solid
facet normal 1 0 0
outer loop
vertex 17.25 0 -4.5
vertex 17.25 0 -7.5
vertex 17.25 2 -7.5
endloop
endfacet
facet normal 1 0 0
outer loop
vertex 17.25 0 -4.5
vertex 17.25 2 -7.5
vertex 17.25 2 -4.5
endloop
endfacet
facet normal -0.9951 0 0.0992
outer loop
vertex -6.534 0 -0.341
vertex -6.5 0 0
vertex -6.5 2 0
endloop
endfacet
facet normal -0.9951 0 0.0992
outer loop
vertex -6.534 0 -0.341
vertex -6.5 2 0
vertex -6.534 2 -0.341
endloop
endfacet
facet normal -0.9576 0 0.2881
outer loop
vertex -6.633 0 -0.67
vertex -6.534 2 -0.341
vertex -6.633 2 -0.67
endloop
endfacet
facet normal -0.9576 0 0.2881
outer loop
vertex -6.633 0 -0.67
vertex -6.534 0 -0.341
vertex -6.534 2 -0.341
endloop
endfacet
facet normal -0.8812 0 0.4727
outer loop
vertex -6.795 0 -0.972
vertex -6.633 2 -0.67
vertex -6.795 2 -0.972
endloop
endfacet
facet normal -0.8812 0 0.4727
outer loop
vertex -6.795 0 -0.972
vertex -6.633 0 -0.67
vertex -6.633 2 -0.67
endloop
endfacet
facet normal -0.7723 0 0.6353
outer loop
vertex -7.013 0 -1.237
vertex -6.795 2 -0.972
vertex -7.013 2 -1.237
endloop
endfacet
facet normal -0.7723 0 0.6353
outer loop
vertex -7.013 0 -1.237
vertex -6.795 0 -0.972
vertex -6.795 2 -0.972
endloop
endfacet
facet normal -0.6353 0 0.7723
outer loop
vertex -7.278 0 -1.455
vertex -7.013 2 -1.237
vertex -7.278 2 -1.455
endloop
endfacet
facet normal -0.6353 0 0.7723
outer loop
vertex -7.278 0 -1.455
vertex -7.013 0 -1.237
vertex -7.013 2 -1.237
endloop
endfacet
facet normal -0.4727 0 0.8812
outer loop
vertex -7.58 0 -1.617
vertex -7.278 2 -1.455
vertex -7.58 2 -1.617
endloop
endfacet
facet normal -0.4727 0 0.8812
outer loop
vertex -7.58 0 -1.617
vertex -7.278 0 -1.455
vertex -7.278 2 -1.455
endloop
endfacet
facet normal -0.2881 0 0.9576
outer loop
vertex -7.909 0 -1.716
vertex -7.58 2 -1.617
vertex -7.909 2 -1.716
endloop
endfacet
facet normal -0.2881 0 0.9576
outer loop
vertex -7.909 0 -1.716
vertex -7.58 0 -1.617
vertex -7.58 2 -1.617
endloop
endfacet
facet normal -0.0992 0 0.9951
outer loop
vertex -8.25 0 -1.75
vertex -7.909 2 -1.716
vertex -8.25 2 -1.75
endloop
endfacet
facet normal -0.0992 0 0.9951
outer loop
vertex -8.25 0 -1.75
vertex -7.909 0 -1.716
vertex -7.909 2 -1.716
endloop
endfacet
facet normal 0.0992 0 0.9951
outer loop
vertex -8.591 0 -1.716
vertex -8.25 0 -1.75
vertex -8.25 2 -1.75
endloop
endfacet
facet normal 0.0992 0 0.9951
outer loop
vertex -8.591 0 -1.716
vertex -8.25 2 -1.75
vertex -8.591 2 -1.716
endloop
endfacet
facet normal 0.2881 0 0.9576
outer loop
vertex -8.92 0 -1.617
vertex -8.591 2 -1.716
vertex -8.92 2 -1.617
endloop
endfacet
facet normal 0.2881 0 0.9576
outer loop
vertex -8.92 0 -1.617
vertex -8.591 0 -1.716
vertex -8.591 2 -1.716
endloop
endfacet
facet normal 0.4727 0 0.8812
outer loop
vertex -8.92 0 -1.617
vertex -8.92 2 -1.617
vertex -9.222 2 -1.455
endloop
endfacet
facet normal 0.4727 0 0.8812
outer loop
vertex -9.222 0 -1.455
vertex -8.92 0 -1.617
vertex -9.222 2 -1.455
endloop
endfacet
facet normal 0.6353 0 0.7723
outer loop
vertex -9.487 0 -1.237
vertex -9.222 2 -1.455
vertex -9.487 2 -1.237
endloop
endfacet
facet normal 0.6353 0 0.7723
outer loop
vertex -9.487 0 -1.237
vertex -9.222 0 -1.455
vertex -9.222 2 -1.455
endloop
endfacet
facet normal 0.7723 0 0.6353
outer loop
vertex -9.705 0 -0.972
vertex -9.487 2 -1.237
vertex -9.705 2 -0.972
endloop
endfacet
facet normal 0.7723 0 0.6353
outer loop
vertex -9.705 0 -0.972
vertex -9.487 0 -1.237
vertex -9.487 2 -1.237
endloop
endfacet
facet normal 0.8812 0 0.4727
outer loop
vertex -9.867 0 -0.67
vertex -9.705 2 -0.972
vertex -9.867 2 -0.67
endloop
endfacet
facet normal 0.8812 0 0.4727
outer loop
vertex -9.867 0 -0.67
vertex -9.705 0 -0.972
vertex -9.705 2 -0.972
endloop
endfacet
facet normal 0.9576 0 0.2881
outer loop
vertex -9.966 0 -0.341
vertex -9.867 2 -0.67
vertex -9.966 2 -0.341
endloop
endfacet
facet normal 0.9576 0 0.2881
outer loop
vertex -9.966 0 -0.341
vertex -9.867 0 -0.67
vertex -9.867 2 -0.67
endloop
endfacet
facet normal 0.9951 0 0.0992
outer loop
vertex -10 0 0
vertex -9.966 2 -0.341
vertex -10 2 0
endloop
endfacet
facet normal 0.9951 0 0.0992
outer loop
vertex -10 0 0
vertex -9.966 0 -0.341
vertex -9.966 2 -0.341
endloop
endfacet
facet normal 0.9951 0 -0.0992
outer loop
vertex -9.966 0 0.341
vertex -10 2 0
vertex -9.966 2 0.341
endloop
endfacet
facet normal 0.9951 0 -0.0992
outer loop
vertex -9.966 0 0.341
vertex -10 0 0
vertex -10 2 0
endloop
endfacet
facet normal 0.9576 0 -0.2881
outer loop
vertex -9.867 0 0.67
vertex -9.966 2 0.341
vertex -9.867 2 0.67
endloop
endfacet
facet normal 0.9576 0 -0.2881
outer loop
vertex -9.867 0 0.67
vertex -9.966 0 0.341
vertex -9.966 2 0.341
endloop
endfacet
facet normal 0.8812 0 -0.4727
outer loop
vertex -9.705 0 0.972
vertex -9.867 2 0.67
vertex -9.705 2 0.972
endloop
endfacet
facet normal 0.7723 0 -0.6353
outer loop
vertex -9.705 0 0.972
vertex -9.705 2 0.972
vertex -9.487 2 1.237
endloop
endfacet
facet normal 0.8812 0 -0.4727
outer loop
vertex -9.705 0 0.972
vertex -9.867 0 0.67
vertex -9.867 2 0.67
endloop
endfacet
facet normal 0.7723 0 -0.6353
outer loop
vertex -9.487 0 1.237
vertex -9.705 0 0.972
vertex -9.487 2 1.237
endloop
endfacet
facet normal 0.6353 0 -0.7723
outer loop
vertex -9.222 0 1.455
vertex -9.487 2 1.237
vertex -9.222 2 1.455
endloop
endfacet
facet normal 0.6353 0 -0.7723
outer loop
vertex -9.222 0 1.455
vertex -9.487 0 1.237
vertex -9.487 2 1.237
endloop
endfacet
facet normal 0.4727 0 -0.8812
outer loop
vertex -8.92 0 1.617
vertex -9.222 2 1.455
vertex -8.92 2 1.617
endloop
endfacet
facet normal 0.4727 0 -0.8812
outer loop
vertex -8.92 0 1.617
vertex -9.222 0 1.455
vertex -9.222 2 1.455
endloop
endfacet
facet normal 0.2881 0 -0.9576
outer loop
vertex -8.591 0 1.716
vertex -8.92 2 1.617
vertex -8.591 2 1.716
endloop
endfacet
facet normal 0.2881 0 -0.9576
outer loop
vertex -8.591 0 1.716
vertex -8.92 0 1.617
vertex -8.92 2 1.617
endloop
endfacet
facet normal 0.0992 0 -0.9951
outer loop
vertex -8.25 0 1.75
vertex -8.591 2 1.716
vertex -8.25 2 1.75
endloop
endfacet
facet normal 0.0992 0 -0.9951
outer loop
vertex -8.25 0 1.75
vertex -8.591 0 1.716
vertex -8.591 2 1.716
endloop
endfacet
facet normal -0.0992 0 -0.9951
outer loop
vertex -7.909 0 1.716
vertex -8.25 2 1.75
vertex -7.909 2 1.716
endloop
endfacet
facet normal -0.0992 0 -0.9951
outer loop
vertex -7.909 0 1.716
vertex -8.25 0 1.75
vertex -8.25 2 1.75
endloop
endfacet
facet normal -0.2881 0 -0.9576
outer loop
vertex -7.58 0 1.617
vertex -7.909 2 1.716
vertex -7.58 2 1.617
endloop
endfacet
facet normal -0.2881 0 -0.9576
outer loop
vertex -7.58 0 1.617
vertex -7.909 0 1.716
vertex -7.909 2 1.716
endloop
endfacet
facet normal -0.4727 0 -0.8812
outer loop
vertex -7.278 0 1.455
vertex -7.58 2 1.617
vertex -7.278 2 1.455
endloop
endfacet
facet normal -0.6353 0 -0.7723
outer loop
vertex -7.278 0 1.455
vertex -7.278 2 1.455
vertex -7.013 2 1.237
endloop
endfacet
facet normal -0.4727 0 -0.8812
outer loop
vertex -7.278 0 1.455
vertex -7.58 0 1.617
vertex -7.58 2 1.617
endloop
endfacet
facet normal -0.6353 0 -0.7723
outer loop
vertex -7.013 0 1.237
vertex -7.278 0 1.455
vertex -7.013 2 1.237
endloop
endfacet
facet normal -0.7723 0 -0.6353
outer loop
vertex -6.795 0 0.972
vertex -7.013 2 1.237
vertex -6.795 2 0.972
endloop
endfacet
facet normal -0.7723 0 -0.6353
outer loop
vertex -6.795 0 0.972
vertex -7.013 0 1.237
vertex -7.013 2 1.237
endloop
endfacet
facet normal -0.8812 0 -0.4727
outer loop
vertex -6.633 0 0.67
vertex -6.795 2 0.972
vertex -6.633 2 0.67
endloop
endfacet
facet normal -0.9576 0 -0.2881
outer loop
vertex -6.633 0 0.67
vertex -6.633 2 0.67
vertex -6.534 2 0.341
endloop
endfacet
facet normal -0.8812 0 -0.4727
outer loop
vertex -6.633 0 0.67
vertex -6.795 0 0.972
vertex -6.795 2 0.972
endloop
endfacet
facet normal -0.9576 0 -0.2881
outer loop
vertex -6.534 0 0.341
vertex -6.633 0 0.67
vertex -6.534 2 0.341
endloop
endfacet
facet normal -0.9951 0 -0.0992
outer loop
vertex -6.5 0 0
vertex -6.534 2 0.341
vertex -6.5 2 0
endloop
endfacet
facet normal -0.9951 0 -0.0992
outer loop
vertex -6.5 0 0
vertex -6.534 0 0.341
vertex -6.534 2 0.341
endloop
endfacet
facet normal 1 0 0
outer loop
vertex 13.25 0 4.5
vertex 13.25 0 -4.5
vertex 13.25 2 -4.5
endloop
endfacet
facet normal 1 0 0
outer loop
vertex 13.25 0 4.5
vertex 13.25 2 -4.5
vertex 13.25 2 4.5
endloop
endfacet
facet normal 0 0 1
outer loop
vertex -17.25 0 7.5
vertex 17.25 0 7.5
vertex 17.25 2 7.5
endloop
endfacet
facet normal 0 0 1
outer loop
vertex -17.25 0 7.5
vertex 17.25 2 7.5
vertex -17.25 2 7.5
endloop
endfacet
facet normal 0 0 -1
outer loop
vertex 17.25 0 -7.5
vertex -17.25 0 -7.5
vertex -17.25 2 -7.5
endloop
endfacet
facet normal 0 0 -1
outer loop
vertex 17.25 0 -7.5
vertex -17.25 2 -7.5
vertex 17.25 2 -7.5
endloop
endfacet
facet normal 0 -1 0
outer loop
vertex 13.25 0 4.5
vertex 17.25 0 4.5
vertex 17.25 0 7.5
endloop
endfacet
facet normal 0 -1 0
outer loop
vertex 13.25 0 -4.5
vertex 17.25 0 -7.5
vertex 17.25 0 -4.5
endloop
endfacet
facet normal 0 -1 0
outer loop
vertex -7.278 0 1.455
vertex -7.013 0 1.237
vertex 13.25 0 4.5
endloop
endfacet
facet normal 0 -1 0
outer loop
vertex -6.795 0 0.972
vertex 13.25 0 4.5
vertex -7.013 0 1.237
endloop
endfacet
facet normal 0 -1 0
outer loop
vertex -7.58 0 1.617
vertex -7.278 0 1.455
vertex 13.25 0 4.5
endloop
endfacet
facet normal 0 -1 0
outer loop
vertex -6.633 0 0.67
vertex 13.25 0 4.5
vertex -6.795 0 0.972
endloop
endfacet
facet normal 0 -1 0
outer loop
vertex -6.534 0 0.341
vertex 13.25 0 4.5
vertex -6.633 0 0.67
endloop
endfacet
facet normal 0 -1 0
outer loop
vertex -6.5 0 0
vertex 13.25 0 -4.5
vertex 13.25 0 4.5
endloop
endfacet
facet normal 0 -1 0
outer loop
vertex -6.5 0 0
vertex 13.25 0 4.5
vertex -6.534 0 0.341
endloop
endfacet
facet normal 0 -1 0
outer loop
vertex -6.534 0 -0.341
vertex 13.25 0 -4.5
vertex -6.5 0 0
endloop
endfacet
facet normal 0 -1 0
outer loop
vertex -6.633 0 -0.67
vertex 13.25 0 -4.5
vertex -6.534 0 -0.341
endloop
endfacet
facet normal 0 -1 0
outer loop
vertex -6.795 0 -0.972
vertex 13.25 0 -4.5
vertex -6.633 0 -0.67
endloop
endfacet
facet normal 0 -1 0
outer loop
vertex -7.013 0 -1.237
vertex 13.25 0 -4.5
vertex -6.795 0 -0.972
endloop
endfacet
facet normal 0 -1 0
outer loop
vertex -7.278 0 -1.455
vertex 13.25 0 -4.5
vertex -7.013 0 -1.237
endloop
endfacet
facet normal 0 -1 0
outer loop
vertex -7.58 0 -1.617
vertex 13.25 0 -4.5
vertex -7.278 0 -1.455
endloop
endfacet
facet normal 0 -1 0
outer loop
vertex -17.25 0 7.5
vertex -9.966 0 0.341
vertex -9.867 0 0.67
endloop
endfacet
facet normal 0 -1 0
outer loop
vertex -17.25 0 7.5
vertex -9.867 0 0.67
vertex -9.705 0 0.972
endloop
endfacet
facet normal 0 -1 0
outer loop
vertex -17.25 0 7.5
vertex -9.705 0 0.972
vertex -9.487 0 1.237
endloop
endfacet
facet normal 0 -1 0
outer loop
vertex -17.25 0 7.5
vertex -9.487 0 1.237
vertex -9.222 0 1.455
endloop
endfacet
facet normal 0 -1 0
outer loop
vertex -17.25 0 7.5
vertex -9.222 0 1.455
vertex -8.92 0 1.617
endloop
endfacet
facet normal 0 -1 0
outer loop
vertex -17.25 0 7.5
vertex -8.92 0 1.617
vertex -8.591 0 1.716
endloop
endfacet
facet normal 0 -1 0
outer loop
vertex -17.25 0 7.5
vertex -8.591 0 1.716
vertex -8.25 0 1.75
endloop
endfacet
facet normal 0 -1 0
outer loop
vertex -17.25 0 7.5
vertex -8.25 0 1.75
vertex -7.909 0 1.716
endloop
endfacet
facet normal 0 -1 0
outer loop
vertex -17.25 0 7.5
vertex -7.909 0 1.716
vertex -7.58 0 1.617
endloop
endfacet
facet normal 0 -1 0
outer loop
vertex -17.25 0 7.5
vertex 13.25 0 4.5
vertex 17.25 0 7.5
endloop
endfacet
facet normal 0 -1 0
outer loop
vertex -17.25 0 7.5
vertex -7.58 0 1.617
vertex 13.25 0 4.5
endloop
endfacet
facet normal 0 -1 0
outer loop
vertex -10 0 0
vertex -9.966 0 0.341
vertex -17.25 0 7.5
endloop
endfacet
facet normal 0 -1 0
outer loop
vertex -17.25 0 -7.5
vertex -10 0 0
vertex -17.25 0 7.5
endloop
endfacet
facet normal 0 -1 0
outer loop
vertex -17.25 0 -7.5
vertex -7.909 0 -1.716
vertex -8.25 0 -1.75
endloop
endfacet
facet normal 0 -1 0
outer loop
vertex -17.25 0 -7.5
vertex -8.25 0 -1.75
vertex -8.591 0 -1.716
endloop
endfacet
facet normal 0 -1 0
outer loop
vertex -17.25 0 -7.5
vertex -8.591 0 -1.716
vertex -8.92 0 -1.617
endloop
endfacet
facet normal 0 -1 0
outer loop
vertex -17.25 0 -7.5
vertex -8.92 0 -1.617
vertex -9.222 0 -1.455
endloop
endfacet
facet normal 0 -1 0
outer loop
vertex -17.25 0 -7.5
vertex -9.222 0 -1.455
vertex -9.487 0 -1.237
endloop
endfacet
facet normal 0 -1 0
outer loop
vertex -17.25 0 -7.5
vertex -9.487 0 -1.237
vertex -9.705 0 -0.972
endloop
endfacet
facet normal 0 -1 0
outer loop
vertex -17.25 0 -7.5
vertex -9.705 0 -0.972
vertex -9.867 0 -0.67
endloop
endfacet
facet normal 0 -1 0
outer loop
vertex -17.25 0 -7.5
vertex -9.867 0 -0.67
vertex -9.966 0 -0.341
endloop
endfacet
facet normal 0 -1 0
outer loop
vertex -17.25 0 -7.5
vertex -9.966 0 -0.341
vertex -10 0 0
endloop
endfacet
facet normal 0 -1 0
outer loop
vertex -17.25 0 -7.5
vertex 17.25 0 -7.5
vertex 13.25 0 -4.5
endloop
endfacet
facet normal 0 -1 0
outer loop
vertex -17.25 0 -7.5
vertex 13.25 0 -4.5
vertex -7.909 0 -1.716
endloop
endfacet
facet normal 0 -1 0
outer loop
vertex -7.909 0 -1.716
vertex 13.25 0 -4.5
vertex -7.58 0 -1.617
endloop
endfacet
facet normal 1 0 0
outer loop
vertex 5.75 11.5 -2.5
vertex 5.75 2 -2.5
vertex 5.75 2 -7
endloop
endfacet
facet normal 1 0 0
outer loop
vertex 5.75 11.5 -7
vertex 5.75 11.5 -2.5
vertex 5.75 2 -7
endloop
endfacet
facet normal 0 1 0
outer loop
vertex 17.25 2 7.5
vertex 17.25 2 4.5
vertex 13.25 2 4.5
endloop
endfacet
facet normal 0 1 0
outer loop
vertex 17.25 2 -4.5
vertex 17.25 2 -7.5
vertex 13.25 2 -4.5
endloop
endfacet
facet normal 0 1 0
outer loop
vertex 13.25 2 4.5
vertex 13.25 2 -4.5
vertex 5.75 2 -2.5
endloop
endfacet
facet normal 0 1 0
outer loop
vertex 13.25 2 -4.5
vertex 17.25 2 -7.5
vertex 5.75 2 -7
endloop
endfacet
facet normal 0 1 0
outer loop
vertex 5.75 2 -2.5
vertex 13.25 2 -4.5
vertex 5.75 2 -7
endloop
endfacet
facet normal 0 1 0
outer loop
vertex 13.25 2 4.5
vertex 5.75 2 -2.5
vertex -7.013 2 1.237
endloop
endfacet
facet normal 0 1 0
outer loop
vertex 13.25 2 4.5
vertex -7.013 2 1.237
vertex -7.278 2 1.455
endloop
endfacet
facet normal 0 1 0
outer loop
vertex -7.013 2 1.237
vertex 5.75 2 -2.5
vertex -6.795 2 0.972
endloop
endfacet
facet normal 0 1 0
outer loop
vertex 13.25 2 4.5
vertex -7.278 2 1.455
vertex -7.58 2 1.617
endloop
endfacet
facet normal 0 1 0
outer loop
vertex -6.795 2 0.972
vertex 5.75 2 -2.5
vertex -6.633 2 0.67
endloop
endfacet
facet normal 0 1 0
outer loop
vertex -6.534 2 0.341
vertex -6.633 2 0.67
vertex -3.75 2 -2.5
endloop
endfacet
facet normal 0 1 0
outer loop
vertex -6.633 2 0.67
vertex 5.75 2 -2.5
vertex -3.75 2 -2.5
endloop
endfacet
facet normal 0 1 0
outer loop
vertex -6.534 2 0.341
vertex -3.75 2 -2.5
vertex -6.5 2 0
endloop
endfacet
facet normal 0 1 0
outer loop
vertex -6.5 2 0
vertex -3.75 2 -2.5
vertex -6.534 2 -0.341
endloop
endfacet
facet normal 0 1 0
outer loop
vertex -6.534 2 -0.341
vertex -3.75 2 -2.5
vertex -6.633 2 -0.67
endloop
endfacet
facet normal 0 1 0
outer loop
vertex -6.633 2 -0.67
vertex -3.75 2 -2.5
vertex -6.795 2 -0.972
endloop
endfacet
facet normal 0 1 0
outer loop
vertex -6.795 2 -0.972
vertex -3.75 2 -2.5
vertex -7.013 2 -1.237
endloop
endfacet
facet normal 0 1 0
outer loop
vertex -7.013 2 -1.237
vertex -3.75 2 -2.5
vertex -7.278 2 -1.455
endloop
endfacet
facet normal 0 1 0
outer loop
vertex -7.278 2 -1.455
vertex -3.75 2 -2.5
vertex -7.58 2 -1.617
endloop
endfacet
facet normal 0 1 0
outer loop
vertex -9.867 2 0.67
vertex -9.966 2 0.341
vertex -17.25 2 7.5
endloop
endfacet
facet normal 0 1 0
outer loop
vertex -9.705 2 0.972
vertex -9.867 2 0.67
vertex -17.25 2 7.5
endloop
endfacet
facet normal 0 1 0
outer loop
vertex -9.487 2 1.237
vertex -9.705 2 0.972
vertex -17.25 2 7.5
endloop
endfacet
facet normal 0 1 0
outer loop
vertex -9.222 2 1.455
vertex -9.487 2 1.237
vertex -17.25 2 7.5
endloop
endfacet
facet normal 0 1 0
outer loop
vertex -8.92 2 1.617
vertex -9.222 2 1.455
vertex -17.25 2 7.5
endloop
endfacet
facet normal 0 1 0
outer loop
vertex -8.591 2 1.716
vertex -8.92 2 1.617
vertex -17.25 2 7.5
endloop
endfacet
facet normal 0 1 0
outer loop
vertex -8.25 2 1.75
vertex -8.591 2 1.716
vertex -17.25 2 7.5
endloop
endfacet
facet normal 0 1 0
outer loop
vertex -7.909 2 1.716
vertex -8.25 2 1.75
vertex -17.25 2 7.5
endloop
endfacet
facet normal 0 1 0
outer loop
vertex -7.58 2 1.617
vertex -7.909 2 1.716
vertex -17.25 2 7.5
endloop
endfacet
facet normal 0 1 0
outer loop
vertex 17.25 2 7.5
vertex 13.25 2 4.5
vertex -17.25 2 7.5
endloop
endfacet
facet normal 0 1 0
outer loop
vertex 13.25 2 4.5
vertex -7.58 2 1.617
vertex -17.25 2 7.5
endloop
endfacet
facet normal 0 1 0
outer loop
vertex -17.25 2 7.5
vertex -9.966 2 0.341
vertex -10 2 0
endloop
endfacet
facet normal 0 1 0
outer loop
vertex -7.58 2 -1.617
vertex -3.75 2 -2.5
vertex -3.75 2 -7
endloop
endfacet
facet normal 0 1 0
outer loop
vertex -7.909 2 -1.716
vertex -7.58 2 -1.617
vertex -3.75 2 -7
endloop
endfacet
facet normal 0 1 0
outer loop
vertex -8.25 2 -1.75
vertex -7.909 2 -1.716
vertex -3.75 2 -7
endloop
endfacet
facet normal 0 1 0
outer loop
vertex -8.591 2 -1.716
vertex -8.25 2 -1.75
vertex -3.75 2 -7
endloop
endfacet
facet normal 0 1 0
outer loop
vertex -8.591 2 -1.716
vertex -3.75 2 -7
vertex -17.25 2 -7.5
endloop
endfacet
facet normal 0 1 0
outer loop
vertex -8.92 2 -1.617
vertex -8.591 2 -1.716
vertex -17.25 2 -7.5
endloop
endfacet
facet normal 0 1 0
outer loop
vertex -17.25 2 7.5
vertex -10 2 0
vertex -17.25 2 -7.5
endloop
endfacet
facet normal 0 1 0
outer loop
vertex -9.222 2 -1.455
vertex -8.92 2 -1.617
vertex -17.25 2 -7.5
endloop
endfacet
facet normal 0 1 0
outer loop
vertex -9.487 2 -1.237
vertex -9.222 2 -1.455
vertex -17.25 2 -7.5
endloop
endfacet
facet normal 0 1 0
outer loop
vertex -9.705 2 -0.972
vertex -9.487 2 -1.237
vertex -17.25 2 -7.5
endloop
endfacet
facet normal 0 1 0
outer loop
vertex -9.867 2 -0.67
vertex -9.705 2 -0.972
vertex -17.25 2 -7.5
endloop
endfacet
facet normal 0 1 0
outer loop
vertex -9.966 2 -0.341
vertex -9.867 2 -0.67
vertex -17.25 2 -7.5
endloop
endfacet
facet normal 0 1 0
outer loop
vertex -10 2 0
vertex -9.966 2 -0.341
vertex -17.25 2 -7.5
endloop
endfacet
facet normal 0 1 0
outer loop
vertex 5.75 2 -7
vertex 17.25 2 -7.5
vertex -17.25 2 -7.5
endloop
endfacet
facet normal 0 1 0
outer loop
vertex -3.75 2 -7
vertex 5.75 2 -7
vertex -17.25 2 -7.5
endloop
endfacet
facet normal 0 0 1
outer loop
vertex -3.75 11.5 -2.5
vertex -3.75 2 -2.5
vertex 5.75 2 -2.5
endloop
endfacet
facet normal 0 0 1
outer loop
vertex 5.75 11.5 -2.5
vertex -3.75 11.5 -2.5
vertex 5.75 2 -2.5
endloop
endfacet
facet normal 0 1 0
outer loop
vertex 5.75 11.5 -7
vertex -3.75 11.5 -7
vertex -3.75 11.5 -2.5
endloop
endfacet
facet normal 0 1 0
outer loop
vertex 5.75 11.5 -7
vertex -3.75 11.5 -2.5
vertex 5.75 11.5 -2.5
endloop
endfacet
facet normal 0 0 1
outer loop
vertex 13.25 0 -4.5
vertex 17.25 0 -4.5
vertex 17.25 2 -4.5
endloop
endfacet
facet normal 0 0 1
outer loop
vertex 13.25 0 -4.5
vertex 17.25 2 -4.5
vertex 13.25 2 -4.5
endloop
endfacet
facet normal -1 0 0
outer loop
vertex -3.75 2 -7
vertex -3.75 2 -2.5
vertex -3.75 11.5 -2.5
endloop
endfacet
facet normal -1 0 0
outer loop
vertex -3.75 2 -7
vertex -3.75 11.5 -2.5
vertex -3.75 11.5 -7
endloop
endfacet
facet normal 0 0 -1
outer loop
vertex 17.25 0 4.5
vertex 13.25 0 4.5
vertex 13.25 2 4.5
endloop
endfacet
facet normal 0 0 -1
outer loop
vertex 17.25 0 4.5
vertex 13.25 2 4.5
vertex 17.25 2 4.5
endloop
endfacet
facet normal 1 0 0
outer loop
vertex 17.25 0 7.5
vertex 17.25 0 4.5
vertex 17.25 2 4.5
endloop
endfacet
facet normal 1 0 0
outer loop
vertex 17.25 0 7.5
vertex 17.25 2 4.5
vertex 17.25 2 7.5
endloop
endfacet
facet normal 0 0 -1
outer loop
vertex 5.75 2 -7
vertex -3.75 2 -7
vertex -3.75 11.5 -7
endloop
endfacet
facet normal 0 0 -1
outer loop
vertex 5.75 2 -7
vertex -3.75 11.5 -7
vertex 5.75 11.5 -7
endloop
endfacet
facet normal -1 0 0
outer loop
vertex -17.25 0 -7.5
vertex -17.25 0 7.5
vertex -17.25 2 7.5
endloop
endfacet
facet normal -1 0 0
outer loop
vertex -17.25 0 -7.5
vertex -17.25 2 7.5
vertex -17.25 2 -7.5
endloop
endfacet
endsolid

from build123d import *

# Parameters (mm, degrees)
SKETCH1_R           = 1.75
BOSS_EXTRUDE1_DEPTH = 2
SKETCH2_W           = 9.5
SKETCH2_H           = 4.5
BOSS_EXTRUDE2_DEPTH = 9.5


with BuildPart() as part:
    # Sketch1 → Boss-Extrude1 (new body)
    with BuildSketch(Plane(origin=(0, 0, 0), x_dir=(1, 0, 0), z_dir=(0, 1, 0))):
        Polygon((17.25, 4.5), (13.25, 4.5), (13.25, -4.5), (17.25, -4.5), (17.25, -7.5), (-17.25, -7.5), (-17.25, 7.5), (17.25, 7.5), align=None)
        with Locations((-8.25, 0)):
            Circle(SKETCH1_R, mode=Mode.SUBTRACT)
    extrude(amount=BOSS_EXTRUDE1_DEPTH)

    # Sketch2 → Boss-Extrude2 (add)
    with BuildSketch(Plane(origin=(0, 2, 0), x_dir=(1, 0, 0), z_dir=(0, 1, 0))):
        with Locations((1, 4.75)):
            Rectangle(SKETCH2_W, SKETCH2_H)
    extrude(amount=BOSS_EXTRUDE2_DEPTH)


solid = part.part
